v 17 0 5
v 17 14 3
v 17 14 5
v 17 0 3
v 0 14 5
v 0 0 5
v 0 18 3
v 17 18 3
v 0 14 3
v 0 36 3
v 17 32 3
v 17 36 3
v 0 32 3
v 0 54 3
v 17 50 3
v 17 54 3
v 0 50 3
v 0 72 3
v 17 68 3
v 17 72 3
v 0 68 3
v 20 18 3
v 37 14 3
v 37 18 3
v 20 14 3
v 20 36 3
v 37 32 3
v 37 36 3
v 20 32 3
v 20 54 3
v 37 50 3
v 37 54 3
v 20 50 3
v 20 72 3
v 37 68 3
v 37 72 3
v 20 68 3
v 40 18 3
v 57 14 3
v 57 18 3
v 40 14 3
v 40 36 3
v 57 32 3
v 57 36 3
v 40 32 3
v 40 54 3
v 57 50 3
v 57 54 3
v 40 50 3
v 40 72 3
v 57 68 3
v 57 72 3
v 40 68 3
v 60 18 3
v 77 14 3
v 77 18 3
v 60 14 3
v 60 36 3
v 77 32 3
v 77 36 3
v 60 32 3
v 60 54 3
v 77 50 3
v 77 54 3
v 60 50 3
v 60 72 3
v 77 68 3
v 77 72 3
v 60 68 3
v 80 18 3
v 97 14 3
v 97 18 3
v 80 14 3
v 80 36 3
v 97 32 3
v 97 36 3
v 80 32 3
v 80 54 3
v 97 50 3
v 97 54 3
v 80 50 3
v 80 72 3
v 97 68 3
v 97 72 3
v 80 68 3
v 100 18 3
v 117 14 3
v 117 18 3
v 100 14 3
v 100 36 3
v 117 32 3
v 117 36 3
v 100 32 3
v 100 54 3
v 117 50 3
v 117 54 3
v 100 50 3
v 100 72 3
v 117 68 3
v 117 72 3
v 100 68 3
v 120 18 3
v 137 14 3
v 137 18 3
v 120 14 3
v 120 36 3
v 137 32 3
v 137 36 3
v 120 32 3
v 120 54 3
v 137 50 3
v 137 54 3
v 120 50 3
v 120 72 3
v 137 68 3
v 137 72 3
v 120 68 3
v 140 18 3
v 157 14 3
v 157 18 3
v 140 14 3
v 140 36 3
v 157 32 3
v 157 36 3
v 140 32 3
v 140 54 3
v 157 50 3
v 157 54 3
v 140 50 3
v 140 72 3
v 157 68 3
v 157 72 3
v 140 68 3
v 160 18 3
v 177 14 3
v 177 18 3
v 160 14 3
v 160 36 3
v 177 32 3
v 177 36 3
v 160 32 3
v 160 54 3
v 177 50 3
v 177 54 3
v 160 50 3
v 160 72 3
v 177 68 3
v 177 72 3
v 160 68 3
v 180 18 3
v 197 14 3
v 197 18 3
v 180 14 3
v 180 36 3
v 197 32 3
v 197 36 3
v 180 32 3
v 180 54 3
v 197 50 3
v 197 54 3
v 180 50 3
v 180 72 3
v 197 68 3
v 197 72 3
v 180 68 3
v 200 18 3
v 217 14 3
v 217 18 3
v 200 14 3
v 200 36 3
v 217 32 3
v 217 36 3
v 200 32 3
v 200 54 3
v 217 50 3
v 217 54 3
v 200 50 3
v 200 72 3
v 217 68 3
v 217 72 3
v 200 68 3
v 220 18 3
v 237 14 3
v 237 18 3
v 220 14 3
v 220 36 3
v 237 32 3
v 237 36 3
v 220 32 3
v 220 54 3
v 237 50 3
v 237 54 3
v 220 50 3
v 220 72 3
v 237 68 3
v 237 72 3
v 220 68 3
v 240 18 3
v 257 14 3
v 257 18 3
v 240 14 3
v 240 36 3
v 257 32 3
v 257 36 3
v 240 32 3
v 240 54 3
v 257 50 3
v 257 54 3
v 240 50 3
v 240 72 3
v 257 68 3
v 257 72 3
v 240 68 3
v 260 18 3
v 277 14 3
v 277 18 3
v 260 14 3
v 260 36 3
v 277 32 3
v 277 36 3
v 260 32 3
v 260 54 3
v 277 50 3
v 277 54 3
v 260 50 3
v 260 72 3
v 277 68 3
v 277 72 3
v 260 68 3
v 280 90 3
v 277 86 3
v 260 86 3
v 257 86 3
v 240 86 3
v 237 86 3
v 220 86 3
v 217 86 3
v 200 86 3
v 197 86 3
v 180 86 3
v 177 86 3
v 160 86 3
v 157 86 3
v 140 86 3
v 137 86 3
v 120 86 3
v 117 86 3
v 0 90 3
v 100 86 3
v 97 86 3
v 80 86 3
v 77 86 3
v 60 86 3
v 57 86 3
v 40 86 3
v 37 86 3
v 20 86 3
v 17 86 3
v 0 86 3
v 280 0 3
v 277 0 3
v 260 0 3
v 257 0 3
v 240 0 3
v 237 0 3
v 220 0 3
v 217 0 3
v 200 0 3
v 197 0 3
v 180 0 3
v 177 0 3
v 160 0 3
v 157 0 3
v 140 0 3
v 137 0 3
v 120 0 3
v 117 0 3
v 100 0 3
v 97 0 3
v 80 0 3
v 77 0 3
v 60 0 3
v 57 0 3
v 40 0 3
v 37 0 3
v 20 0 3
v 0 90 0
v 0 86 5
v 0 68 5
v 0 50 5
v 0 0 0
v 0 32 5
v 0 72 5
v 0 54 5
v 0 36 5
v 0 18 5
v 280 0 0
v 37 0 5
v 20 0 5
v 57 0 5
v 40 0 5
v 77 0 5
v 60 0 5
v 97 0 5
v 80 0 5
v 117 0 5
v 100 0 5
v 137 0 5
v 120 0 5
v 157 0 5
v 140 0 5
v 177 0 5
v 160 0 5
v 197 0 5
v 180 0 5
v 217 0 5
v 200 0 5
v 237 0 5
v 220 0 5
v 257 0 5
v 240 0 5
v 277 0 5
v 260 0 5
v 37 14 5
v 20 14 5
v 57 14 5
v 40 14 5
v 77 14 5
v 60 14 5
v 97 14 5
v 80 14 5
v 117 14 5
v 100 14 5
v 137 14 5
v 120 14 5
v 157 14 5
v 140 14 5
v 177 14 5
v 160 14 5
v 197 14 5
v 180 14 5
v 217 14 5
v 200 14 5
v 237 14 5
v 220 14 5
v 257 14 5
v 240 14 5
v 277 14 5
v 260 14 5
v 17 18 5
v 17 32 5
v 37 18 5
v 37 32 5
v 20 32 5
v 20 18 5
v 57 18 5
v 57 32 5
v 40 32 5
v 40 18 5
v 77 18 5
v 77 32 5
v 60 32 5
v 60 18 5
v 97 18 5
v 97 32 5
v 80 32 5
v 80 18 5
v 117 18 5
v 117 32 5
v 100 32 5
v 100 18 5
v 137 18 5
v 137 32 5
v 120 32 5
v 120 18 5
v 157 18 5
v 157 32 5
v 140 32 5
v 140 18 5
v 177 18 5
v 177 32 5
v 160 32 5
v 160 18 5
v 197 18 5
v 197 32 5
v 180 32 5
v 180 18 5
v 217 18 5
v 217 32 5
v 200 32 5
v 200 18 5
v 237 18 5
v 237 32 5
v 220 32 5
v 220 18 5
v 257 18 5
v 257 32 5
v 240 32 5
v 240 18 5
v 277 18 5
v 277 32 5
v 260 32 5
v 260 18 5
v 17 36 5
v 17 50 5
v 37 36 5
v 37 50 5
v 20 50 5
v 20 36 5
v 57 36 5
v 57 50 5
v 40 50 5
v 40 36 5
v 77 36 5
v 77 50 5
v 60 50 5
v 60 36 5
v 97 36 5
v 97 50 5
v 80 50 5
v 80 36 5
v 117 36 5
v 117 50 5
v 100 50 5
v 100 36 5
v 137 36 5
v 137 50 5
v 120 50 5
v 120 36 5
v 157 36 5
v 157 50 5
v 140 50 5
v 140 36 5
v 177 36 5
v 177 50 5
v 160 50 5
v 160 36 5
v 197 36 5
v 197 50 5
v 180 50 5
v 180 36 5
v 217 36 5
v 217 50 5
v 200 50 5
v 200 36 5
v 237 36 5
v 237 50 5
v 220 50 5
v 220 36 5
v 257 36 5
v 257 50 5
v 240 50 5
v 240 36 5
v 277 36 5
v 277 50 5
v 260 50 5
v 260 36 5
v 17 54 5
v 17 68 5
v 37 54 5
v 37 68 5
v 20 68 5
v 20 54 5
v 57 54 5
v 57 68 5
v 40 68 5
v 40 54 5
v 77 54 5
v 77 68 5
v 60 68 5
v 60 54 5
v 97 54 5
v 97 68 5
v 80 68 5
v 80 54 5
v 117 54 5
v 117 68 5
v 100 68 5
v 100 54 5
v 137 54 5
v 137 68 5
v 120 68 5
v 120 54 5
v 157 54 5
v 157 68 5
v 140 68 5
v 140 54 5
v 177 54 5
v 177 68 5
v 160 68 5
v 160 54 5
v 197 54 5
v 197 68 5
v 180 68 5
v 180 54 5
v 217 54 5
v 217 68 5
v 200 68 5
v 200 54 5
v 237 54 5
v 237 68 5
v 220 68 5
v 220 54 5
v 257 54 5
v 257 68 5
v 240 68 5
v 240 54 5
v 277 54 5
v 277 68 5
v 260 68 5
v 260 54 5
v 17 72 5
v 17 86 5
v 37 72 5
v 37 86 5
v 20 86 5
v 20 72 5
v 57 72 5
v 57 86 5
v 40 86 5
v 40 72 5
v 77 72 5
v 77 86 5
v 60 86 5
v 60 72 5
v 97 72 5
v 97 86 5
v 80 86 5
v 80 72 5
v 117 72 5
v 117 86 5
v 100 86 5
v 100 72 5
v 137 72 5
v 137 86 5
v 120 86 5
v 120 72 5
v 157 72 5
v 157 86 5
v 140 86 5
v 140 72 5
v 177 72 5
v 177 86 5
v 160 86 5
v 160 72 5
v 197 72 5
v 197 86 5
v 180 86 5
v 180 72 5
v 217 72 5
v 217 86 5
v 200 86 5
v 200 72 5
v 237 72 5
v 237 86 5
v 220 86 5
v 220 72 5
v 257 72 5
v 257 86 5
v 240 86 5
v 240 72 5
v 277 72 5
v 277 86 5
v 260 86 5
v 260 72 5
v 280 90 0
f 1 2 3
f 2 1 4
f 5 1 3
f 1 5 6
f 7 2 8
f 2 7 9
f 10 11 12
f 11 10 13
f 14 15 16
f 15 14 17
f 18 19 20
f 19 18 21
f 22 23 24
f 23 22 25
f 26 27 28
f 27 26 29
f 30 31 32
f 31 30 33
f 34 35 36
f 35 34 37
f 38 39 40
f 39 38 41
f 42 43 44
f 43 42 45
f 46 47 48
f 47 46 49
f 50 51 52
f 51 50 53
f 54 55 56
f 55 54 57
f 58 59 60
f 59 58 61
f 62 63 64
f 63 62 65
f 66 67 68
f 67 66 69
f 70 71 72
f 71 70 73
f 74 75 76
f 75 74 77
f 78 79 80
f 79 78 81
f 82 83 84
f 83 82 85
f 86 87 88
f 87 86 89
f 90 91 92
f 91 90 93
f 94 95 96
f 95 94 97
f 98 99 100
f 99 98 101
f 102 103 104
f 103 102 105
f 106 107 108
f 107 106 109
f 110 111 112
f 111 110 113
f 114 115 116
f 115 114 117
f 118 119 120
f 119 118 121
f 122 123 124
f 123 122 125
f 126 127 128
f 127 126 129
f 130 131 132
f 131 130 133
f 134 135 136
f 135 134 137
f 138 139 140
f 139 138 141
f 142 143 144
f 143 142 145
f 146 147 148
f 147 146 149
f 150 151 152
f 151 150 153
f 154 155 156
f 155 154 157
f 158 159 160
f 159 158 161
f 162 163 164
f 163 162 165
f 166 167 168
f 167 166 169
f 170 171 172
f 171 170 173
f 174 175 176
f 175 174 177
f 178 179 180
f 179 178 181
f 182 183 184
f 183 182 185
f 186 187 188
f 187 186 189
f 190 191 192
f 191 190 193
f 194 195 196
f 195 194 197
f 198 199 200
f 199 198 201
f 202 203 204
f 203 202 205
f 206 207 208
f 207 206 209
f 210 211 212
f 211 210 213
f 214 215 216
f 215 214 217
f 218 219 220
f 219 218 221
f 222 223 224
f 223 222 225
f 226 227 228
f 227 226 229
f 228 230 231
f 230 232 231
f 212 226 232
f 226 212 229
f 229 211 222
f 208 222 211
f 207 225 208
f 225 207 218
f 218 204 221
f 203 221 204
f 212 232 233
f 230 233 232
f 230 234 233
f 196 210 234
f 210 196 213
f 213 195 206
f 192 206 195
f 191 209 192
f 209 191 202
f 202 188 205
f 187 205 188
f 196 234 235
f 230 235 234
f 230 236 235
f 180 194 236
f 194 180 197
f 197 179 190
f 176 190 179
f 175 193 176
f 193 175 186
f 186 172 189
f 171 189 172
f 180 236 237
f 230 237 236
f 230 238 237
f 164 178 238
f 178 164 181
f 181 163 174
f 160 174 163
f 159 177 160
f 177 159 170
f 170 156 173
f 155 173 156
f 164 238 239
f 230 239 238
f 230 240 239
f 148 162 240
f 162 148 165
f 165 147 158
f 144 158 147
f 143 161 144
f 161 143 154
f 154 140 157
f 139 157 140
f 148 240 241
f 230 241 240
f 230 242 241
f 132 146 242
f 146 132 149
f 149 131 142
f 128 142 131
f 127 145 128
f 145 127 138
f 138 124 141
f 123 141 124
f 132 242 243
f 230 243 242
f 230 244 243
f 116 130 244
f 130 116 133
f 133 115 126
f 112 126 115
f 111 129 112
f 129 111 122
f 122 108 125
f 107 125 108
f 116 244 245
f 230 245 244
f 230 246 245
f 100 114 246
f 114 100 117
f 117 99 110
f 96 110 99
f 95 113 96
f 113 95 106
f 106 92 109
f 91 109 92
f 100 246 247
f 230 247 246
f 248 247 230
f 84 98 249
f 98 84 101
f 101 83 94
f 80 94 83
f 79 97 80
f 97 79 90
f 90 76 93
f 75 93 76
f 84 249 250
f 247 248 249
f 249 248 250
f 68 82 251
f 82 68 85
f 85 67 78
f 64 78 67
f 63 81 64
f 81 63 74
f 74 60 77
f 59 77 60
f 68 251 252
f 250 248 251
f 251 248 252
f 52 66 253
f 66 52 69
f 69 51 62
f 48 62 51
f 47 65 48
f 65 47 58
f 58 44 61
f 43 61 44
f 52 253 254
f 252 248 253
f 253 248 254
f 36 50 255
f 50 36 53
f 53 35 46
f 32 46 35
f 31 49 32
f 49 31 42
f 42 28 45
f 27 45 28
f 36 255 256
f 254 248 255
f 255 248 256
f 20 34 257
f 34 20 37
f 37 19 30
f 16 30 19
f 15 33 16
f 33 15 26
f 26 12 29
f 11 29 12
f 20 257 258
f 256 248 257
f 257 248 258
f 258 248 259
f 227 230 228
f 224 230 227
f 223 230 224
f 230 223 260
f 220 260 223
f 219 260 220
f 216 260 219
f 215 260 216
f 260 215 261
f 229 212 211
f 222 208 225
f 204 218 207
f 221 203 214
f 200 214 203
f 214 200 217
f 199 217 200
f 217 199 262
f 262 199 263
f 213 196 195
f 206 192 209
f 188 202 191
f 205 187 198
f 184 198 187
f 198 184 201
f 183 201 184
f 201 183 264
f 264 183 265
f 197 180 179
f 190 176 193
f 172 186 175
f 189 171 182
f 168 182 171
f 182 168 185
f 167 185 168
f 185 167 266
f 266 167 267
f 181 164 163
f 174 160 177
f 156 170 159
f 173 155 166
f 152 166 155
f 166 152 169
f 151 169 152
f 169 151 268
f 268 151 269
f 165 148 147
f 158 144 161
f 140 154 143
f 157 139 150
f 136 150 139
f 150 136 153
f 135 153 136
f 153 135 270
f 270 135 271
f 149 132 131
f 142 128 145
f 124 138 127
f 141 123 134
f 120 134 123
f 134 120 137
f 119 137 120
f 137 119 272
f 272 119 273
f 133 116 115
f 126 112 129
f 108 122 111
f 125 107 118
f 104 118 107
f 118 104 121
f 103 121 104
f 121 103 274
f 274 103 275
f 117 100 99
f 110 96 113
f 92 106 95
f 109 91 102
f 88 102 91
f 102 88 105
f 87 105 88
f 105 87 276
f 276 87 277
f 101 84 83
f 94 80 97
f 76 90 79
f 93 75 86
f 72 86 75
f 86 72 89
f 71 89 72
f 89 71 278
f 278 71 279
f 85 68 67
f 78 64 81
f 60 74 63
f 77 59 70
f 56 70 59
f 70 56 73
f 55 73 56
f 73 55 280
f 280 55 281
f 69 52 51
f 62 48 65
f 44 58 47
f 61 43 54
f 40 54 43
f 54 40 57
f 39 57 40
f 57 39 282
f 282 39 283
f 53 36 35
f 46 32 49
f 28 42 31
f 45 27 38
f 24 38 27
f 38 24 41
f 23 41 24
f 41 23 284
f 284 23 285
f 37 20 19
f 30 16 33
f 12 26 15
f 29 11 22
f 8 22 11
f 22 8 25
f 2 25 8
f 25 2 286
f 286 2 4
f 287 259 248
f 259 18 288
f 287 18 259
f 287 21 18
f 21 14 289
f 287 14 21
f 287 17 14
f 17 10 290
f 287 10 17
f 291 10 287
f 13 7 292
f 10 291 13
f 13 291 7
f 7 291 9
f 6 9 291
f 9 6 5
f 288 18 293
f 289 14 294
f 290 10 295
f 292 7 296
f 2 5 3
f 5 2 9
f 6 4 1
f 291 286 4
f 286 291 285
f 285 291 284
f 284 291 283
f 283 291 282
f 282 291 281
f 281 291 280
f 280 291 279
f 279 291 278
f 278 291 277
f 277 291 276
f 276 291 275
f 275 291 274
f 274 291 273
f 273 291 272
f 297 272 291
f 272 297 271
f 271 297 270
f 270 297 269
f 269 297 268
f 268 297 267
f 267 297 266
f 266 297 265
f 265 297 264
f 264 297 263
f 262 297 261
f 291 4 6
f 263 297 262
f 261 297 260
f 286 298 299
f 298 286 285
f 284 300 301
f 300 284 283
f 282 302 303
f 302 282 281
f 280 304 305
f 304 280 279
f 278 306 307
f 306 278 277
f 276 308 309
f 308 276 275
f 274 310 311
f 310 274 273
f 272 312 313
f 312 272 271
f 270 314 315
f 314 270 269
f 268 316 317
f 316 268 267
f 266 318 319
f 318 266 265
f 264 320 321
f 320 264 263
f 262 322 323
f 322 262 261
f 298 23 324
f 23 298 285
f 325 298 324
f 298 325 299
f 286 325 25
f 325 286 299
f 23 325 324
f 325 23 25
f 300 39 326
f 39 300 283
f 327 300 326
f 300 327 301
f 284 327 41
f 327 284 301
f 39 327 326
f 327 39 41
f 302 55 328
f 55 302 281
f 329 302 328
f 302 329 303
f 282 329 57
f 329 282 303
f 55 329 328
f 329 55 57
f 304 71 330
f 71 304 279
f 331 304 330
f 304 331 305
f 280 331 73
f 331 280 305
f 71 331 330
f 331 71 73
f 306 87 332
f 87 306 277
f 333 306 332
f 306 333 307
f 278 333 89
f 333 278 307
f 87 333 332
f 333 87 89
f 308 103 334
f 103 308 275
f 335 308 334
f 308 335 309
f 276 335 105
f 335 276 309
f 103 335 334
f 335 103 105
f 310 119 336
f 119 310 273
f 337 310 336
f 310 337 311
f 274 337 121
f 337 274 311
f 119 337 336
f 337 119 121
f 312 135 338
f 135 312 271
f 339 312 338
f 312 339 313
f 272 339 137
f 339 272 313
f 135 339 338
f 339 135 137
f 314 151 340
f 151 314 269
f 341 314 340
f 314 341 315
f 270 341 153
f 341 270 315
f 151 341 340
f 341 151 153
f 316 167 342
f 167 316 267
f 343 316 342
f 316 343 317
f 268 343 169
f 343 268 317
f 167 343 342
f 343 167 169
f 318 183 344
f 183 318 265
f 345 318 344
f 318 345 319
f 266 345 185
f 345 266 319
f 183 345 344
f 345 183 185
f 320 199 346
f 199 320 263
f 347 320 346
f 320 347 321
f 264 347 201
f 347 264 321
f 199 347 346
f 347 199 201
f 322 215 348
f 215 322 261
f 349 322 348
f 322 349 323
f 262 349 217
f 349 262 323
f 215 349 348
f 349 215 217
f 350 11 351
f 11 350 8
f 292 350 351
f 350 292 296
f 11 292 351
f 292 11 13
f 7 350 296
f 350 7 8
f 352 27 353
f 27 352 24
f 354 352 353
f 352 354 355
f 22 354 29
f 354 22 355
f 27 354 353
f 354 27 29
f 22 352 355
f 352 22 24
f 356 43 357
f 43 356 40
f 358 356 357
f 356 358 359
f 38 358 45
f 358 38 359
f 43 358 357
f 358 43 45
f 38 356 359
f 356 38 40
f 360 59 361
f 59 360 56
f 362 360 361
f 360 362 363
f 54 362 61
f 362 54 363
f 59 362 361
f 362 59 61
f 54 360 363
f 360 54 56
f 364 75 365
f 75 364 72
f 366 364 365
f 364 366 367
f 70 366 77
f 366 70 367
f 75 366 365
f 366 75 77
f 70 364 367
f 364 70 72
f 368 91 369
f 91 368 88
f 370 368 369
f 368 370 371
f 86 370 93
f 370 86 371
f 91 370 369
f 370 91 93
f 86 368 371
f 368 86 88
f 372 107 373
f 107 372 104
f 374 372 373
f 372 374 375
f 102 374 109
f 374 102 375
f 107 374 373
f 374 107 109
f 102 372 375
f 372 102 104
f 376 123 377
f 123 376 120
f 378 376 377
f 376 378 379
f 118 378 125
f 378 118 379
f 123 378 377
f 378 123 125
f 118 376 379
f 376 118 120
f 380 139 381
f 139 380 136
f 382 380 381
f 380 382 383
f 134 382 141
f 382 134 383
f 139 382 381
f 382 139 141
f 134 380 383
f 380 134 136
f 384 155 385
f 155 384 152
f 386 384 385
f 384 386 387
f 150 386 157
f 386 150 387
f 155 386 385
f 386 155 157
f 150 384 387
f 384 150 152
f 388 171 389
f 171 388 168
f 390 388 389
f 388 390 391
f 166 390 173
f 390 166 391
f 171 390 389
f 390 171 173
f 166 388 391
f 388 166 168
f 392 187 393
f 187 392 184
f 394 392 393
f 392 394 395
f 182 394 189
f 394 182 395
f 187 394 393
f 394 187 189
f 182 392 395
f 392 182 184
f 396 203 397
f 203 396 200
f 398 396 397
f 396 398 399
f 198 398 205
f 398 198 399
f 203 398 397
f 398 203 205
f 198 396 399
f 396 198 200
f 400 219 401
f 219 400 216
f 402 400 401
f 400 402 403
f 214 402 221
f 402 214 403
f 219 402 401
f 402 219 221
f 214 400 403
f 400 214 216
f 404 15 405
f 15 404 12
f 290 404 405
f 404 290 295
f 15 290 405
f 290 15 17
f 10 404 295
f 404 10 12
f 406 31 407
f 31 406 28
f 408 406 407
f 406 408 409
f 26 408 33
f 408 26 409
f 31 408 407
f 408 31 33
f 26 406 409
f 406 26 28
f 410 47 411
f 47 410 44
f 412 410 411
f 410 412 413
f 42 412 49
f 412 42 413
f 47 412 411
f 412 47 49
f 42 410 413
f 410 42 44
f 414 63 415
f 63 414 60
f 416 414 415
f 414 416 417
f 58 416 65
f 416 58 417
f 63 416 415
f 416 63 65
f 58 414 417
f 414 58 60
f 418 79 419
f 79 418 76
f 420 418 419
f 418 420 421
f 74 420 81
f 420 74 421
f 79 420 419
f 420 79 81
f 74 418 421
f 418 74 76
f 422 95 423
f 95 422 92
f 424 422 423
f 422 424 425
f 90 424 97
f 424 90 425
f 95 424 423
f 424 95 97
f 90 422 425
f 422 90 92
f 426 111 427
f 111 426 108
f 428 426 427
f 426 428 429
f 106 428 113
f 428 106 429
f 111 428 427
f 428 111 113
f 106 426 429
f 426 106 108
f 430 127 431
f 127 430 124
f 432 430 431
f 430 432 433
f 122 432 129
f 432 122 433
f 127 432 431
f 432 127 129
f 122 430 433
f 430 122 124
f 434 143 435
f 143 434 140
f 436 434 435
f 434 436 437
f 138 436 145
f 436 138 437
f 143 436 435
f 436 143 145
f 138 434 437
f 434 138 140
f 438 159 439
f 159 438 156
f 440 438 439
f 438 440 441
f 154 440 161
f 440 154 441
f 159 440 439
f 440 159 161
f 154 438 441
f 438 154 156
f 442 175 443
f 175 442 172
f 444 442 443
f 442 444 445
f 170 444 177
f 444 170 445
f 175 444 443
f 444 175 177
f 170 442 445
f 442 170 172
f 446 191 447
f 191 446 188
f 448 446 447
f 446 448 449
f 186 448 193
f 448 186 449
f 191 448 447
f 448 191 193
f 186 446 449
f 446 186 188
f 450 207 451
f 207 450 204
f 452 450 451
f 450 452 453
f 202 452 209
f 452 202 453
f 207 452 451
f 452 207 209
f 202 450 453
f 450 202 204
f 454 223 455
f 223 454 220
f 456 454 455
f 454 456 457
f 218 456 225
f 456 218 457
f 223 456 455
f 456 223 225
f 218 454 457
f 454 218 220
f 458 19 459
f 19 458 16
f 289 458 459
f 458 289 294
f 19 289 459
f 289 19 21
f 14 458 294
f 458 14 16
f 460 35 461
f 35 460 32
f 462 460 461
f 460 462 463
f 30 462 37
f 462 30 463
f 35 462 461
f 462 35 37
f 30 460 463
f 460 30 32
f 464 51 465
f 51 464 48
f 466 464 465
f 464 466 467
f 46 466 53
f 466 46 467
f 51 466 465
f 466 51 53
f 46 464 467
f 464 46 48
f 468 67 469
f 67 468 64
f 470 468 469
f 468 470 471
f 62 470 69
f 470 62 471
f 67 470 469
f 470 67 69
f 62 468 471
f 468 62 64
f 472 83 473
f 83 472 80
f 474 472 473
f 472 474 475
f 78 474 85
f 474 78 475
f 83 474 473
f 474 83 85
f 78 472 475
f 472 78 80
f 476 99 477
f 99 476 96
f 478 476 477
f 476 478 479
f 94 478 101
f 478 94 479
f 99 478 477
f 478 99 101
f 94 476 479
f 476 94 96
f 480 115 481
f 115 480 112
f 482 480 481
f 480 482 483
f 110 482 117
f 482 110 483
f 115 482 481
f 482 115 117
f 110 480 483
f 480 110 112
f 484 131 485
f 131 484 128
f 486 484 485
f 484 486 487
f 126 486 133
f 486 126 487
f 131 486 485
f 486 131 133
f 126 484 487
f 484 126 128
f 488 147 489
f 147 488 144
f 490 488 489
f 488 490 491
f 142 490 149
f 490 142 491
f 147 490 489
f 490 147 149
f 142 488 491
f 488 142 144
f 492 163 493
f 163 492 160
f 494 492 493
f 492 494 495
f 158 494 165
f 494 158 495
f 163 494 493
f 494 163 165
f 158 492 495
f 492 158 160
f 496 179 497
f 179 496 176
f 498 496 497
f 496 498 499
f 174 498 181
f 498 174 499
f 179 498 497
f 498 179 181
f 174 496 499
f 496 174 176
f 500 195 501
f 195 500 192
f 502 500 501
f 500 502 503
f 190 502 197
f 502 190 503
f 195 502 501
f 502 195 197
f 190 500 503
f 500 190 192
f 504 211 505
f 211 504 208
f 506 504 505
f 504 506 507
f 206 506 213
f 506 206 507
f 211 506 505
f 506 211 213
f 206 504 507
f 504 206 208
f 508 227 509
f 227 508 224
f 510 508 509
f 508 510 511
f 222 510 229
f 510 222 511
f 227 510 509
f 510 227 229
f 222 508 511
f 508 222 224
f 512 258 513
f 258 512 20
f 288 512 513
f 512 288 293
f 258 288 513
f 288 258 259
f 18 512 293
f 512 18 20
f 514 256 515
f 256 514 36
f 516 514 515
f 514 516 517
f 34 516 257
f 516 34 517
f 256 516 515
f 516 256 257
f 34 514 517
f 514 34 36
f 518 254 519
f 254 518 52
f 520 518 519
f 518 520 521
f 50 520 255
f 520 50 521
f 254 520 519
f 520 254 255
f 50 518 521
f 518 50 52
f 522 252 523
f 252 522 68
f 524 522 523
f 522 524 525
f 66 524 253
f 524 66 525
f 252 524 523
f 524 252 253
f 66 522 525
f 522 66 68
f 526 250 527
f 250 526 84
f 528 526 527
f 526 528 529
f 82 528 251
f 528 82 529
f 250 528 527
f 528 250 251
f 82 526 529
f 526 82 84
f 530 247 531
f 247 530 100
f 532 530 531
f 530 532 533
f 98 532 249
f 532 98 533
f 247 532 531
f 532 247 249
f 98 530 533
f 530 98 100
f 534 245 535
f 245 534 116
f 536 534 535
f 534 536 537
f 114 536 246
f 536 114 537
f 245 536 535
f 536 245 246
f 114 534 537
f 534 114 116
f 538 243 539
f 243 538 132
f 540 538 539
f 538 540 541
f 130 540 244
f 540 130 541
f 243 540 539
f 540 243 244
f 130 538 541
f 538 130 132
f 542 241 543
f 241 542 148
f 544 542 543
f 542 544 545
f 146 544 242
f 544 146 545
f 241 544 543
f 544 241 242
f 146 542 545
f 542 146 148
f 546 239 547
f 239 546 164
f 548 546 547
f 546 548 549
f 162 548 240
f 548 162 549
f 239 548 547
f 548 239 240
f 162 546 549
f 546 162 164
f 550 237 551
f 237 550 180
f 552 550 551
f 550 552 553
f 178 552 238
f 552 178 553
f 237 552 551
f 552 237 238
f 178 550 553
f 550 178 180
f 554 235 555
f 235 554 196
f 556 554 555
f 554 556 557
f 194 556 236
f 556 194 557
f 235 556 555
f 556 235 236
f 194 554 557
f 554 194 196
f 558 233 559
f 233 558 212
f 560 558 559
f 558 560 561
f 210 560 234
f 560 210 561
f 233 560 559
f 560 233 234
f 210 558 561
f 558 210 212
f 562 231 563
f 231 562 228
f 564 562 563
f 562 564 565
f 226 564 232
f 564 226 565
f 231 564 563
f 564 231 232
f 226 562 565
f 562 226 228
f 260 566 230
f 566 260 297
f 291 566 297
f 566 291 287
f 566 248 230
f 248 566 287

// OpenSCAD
// Concept only. Provisional dimensions in mm.
$fn=32;
cube([280,90,3]);for(r=[0:4])for(c=[0:13])translate([c*20,r*18,3])cube([17,14,2]);
